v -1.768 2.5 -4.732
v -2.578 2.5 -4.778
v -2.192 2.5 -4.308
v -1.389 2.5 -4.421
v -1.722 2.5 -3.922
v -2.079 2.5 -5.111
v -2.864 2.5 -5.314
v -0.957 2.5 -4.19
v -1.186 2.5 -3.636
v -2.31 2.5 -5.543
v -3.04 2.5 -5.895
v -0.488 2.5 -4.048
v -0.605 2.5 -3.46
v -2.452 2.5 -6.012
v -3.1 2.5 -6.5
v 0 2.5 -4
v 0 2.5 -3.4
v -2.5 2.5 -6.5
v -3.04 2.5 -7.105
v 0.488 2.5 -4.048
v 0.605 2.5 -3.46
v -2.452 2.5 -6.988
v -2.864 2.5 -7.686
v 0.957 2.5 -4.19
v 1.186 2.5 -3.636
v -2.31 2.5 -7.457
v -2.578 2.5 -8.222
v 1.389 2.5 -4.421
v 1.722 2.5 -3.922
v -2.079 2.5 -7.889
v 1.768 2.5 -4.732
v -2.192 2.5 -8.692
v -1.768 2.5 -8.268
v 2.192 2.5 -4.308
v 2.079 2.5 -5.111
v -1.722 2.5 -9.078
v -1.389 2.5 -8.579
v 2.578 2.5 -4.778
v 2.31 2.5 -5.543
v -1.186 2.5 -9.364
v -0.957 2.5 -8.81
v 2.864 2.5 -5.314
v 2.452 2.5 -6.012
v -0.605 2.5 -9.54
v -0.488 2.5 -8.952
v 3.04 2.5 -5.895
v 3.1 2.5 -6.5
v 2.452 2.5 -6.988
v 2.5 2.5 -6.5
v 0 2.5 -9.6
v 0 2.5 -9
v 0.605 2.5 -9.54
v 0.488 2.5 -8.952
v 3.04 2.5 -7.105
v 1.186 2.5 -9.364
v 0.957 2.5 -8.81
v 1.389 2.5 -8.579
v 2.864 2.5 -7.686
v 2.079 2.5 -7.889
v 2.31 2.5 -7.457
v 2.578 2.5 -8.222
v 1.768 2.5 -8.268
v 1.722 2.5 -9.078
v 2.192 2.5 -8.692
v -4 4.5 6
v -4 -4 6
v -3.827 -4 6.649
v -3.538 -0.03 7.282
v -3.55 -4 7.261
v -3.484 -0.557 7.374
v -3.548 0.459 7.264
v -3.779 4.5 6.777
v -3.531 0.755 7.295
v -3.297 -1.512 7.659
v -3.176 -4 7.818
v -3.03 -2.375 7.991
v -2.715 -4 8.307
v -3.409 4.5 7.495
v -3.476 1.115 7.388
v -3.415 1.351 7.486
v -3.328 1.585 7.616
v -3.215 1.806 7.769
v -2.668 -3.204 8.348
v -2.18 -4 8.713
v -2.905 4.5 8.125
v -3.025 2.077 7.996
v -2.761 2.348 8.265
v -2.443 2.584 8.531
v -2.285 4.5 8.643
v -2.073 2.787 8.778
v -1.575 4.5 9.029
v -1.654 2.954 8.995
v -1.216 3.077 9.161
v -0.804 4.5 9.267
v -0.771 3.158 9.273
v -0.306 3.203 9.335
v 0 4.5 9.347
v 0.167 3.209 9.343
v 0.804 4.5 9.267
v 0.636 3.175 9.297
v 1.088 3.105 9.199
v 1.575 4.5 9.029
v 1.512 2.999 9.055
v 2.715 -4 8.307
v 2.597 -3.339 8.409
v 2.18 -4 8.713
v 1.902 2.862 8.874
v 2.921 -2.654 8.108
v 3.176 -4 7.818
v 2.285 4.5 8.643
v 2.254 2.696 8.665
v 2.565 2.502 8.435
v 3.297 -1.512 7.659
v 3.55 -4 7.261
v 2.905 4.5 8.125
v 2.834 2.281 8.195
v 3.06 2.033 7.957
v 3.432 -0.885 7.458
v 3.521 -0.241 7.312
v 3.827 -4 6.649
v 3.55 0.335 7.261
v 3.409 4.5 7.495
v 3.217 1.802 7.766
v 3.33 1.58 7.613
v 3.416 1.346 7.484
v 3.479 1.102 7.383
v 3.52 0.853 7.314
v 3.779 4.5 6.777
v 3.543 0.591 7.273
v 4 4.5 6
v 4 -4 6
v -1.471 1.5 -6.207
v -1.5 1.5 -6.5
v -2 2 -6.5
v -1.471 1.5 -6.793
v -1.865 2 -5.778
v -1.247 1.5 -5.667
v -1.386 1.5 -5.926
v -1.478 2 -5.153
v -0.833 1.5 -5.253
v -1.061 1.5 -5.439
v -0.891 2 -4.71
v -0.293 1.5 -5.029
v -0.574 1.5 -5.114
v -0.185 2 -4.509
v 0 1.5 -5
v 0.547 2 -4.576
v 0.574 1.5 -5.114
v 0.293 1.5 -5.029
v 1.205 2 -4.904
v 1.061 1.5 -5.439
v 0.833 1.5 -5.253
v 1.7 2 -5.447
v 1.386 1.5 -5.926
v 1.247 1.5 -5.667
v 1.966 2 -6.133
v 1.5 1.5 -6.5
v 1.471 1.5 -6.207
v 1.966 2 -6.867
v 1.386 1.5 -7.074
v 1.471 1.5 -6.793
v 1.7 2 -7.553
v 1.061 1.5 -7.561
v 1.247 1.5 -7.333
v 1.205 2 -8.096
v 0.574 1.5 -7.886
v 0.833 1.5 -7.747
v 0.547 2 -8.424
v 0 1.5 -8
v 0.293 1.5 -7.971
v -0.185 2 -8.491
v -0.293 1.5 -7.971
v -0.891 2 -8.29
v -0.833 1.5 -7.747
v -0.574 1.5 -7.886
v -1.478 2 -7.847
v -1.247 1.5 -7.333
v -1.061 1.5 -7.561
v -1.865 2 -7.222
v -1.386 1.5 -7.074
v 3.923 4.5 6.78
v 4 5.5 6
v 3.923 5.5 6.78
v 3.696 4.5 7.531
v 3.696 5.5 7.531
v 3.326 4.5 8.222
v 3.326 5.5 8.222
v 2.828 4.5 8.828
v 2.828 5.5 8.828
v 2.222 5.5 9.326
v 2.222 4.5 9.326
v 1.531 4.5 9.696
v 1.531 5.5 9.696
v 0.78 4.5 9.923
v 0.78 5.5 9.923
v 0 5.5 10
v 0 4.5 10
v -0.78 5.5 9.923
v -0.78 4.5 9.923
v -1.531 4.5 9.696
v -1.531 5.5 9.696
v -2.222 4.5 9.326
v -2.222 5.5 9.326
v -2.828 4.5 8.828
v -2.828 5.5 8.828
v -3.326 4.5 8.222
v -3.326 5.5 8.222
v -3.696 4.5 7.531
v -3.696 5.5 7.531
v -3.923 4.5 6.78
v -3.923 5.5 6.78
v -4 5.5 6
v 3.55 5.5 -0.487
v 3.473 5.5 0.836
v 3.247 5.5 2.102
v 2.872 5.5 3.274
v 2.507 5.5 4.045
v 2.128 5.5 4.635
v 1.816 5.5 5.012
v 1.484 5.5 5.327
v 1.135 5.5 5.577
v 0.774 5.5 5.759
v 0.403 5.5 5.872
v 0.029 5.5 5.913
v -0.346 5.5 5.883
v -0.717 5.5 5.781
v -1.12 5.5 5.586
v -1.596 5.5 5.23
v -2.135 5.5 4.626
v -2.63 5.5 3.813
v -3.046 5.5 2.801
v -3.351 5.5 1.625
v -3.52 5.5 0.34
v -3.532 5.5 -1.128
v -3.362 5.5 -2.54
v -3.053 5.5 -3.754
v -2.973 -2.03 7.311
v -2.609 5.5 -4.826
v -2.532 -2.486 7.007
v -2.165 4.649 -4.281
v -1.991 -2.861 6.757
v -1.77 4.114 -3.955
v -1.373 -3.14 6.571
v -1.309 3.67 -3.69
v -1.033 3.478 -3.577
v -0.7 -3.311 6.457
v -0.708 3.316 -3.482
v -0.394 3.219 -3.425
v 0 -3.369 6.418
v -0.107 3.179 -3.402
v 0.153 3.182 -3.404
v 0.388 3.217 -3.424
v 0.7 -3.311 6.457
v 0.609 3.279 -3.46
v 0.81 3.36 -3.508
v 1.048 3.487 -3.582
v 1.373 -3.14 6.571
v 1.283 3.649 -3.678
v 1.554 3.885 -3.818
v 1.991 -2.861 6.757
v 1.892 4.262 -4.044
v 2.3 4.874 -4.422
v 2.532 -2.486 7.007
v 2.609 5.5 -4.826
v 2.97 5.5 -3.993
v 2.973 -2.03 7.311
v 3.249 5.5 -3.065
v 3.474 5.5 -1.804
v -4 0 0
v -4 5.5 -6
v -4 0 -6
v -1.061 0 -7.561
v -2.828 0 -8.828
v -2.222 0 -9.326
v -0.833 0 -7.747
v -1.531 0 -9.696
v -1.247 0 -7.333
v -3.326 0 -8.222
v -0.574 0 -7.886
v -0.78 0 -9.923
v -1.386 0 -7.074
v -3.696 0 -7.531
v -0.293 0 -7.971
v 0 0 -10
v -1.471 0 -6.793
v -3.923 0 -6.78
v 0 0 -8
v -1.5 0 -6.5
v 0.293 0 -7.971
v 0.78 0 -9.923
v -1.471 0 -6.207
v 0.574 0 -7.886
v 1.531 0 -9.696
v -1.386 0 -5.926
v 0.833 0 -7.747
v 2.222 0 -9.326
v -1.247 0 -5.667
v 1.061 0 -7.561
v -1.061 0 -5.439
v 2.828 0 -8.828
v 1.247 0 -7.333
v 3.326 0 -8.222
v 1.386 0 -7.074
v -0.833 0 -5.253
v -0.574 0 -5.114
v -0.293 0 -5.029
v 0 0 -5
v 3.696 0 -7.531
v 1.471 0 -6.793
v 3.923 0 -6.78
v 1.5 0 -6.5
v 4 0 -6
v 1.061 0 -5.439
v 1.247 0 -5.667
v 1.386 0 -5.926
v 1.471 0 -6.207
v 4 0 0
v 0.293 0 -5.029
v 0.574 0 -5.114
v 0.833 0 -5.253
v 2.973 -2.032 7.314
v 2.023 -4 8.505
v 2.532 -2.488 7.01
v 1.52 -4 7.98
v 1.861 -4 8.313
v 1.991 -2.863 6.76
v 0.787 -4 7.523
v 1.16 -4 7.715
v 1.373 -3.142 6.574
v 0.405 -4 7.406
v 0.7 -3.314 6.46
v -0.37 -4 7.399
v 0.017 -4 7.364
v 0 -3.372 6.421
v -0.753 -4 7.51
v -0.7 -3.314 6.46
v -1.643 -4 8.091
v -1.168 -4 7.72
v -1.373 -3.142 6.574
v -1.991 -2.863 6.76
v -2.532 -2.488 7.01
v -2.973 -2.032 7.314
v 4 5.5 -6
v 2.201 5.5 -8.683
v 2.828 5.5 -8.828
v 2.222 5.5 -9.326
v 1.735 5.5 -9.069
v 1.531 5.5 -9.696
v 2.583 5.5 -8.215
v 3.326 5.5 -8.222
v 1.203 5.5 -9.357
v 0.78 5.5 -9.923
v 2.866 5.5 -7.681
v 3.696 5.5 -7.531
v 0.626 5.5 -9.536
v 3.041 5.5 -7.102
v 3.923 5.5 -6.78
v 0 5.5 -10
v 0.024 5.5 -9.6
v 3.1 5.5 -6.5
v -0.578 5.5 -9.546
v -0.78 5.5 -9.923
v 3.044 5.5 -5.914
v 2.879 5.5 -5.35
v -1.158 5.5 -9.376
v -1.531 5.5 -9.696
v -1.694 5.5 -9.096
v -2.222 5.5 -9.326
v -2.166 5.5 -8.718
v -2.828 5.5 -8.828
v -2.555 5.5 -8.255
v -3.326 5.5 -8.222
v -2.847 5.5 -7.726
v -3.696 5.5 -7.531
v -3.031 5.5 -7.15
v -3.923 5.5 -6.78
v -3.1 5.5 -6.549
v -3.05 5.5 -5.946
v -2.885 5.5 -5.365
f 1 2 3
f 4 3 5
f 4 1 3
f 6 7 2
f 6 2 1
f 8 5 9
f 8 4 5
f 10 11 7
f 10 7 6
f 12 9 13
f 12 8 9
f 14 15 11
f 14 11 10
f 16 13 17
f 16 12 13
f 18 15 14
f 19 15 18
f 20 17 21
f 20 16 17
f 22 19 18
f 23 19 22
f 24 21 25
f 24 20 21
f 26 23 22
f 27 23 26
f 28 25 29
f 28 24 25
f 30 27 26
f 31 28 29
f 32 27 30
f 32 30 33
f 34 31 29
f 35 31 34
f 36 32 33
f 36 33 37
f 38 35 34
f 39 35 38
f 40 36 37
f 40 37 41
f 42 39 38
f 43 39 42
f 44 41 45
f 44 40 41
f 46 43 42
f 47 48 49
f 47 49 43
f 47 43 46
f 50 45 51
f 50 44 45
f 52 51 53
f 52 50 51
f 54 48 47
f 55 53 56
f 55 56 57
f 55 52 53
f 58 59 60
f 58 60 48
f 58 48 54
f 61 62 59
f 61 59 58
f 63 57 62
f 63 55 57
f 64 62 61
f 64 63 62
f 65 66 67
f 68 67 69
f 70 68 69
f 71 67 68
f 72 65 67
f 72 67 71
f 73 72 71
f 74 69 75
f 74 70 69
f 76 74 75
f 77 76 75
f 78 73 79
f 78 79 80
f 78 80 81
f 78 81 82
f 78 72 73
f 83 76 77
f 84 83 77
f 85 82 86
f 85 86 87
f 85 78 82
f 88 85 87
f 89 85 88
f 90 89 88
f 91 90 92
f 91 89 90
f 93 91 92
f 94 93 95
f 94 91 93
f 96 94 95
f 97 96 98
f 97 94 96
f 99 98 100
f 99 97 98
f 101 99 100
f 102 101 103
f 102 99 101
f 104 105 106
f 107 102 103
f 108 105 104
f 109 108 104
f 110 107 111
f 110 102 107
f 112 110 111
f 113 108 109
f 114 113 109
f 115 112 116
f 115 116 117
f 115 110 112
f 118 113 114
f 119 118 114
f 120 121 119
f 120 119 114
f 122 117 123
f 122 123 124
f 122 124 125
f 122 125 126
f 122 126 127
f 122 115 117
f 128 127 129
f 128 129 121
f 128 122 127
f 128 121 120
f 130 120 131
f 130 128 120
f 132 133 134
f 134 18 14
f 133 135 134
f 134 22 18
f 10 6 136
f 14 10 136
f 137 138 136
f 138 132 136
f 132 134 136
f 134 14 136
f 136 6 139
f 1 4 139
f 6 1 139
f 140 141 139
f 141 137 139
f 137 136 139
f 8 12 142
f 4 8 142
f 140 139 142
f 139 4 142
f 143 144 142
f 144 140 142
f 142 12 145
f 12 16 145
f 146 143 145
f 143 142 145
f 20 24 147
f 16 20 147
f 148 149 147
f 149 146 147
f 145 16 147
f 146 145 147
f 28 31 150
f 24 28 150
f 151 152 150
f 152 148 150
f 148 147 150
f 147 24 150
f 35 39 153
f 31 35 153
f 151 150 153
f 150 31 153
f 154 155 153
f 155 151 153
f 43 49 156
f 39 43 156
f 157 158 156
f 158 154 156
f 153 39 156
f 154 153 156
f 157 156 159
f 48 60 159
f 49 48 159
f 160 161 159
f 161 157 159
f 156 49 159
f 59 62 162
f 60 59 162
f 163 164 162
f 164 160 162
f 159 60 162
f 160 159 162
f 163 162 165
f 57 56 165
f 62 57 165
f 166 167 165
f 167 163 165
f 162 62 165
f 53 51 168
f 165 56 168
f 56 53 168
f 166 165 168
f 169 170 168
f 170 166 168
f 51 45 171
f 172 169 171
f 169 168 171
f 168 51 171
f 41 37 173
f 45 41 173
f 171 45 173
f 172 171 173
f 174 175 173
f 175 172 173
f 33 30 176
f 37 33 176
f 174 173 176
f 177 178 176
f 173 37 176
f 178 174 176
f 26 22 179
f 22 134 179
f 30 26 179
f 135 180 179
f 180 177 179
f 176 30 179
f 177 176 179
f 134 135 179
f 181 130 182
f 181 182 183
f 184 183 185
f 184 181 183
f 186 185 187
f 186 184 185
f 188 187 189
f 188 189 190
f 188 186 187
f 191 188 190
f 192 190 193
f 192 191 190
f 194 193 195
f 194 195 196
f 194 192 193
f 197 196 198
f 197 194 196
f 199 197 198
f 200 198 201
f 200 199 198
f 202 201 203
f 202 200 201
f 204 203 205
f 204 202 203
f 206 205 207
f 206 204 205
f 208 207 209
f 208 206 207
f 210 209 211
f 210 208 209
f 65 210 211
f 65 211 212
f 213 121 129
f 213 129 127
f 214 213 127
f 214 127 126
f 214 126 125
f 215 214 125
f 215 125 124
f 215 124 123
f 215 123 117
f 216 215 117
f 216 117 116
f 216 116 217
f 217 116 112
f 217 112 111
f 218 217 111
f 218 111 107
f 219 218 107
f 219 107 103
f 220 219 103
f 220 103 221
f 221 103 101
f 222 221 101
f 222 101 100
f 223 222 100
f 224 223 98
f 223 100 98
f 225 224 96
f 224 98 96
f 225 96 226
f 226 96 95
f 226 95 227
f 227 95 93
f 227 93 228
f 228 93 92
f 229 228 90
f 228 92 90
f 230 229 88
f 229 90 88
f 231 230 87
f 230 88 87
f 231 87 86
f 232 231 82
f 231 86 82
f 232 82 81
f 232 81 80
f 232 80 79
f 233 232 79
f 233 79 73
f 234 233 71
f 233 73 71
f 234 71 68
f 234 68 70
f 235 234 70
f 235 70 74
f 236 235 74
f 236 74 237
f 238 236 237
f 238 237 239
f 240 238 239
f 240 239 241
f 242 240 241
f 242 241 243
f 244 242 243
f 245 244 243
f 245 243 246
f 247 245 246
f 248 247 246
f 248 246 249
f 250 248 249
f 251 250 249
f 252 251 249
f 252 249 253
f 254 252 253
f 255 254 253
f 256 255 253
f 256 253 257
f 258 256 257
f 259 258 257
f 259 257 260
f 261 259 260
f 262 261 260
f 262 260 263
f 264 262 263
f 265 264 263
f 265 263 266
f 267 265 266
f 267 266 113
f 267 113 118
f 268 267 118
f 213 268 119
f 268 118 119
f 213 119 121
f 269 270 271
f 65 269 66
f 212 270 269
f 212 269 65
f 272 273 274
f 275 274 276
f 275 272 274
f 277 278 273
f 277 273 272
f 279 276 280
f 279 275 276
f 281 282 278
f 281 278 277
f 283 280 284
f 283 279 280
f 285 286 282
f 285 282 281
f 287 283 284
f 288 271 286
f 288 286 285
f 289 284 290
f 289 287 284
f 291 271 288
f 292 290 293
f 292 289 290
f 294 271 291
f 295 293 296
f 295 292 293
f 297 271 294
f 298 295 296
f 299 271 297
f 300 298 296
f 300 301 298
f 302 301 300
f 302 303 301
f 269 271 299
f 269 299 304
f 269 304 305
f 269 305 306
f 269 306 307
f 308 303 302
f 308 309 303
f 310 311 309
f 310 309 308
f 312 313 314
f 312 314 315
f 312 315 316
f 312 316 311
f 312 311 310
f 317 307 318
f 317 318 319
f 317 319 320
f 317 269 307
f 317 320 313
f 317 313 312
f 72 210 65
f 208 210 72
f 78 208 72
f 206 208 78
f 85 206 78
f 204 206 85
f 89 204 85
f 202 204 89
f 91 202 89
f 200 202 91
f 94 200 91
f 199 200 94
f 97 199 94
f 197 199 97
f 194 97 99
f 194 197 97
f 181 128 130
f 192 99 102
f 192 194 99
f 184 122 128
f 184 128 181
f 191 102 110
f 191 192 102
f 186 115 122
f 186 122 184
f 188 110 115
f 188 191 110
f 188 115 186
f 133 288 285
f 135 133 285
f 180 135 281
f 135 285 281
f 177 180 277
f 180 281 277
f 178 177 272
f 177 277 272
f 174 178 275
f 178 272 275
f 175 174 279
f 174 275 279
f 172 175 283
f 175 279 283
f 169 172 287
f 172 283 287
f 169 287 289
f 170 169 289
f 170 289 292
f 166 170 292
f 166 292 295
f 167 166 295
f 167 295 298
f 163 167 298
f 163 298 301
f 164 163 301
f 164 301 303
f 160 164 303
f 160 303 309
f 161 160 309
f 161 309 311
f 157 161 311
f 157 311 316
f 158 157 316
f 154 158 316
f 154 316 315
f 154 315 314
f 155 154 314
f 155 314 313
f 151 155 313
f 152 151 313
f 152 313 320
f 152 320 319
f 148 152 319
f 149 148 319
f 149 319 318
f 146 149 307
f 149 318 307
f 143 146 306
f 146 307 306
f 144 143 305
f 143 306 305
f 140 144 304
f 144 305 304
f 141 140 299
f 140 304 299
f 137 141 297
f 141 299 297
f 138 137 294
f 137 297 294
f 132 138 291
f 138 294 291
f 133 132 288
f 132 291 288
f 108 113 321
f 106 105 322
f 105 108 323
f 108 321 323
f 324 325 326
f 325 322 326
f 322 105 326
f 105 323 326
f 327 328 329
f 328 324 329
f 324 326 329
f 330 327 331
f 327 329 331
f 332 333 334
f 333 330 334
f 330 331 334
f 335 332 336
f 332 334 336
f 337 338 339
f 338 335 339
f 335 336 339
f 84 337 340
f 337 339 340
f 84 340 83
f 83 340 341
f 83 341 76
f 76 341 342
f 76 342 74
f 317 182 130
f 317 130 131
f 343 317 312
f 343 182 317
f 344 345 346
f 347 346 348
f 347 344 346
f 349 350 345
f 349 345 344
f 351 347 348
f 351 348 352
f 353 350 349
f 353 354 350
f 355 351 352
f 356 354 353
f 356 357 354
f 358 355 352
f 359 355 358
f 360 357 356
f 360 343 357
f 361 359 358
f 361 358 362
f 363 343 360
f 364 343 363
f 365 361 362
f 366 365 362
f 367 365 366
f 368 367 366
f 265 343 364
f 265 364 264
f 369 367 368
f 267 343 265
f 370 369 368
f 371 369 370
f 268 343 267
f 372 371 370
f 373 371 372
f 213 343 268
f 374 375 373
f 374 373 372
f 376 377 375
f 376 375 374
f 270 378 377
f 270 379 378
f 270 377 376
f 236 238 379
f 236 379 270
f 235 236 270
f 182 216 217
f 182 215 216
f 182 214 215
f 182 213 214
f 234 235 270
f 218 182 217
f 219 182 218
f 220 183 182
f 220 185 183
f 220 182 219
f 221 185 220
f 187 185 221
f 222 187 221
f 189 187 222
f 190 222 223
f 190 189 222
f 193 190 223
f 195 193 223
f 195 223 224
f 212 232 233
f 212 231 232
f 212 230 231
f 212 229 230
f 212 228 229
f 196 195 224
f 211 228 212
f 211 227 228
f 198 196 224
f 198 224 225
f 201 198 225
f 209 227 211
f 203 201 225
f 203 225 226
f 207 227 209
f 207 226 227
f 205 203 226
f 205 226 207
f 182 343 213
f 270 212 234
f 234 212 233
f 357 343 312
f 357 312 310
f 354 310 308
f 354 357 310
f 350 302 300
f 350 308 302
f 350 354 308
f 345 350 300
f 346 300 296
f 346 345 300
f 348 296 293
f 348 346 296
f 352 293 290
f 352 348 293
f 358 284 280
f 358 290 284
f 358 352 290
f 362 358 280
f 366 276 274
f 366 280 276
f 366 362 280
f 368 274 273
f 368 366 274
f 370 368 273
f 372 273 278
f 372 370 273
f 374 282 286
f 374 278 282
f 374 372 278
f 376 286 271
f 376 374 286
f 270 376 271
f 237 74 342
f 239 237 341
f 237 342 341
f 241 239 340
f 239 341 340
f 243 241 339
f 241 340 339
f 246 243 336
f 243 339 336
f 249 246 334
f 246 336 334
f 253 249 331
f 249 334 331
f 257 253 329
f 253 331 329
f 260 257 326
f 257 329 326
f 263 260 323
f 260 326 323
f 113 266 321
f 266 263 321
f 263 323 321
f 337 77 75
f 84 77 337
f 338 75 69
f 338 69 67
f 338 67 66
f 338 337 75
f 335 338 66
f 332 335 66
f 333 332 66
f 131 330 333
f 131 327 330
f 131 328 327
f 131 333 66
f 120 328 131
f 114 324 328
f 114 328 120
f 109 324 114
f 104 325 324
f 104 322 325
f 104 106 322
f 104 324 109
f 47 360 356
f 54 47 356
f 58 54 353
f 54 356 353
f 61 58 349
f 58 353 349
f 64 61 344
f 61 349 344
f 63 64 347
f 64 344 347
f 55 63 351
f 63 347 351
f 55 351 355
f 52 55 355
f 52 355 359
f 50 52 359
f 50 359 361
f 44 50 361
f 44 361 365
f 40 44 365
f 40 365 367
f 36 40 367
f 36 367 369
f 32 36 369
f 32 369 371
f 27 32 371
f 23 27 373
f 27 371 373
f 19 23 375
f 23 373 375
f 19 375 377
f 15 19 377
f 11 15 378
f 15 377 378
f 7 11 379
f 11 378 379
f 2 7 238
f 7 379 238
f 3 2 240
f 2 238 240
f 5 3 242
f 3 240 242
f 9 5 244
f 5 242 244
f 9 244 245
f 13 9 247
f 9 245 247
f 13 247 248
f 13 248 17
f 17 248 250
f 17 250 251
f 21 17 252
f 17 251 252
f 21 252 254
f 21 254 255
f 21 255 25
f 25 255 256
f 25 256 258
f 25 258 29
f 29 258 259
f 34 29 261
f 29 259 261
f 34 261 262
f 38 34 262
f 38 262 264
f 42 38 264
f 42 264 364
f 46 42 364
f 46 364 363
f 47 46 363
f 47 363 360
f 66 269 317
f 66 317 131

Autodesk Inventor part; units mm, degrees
ref_plane "YZ Plane" through (0, 0, 0) normal (1, 0, 0) x (0, 1, 0)
ref_plane "XZ Plane" through (0, 0, 0) normal (0, 1, 0) x (-1, 0, 0)
ref_plane "XY Plane" through (0, 0, 0) normal (0, 0, 1) x (1, 0, 0)
sketch "Sketch1" plane through (0, 0, 0) normal (0, 1, 0) x (-1, 0, 0)
  line L0 (0, 10) -> (0, 10)
  line L1 (-4, 6) -> (-4, -6)
  line L2 (0, -10) -> (0, -10)
  line L3 (4, -6) -> (4, 6)
  line L4 (4, 10) -> (-4, -10) construction
  line L5 (-4, 10) -> (4, -10) construction
  circle A0 centre (0, -6.5) radius 1.5
  arc A1 (0, -10) -> (4, -6) centre (0, -6) ccw
  arc A2 (-4, -6) -> (0, -10) centre (0, -6) ccw
  arc A3 (4, 6) -> (0, 10) centre (0, 6) ccw
  arc A4 (0, 10) -> (-4, 6) centre (0, 6) ccw
  point P0 (0, 0)
  dimension "d0" = 8
  dimension "d1" = 20
  dimension "d2" = 3
  dimension "d3" = 3.5
  dimension "d4" = 4
extrude "Extrusion1" add sketch "Sketch1" along normal blind 5.5
sketch "Sketch2" plane through (0, 0, 0) normal (0, -1, 0) x (1, 0, 0)
  circle A0 centre (0, -6.5) radius 1.5 construction
  line L0 (-4, -6) -> (-4, 6) construction
  arc A1 (-4, -6) -> (4, -6) centre (0, -6) ccw construction
  line L1 (4, 6) -> (4, -6) construction
  arc A2 (4, 6) -> (-4, 6) centre (0, 6) ccw construction
  arc A3 (4, 6) -> (-4, 6) centre (0, 6) ccw projected
  arc A4 (4, 6) -> (-4, 6) centre (0, 5.2831) ccw
  point P0 (0, 0)
extrude "Extrusion2" cut sketch "Sketch2" against normal blind 4.5
sketch "Sketch4" plane through (0, 0, 0) normal (0, -1, 0) x (1, 0, 0)
  arc A0 (4, 6) -> (-4, 6) centre (0, 5.2831) ccw projected
  line L0 (-4, -6) -> (-4, 6) projected
  arc A1 (-4, -6) -> (4, -6) centre (0, -6) ccw projected
  line L1 (4, 6) -> (4, -6) projected
  circle A2 centre (0, -6.5) radius 1.5 projected
  point P0 (0, 0)
extrude "Extrusion3" add sketch "Sketch4" along normal blind 4
sketch "Sketch6" plane through (0, -4, 0) normal (0, -1, 0) x (1, 0, 0)
  circle A0 centre (0, -6.5) radius 1.5 projected
  arc A1 (-4, -6) -> (4, -6) centre (0, -6) ccw projected
  line L0 (4, 0) -> (4, -6)
  line L1 (4, 0) -> (-4, 0)
  arc A2 (-4, -6) -> (4, -6) centre (0, -6) ccw projected
  line L2 (-4, 0) -> (-4, -6)
  point P0 (0, 0)
extrude "Extrusion4" cut sketch "Sketch6" against normal blind 4
sketch "Sketch7" plane through (-4, 5.5, -6) normal (-1, 0, 0) x (0, 0, 1)
  line L0 (12, -9.5) -> (15.3469, -9.5) projected
  line L1 (6, -9.5) -> (12, -9.5) projected
  line L2 (12, -9.5) -> (6, -9.5)
  line L3 (6, -5.5) -> (6, -9.5) projected
  line L4 (6, -9.5) -> (6, -5.5)
  line L5 (12, -9.5) -> (12, -1) projected
  line L6 (6, -5.5) -> (12, -9.5)
extrude "Extrusion5" cut sketch "Sketch7" against normal through all
ref_plane "Work Plane1" through (-4, 0.1603, 8.7735) normal (0, -0.8321, -0.5547) x (1, 0, 0)
sketch "Sketch8" plane through (0, -4, 0) normal (0, -1, 0) x (1, 0, 0)
  line L0 (-4, 6) -> (4, 6) construction
  arc A0 (4, 6) -> (-4, 6) centre (0, 5.2831) ccw construction
  point P0 (0, 0)
  point P1 (0, 9.3469)
ref_plane "Work Plane3" through (-2, -4, 6) normal (0, 0.5547, -0.8321) x (1, 0, 0)
sketch "Sketch10" plane through (-2, -4, 6) normal (0, 0.5547, -0.8321) x (1, 0, 0)
  circle A0 centre (2, -4.3065) radius 3.55
  point P0 (2, 0)
  dimension "d18" = 7.1
extrude "Extrusion6" cut sketch "Sketch10" along normal blind 20 and the other way blind 10
sketch "Sketch11" plane through (0, 5.5, 0) normal (0, 1, 0) x (1, 0, 0)
  arc A0 (1.4864, 6.2983) -> (-1.4864, 6.2983) centre (0, 6.5) ccw construction
  circle A1 centre (0, 6.5) radius 3.1
  point P0 (0, 0)
  dimension "d23" = 6.2
extrude "Extrusion7" cut sketch "Sketch11" against normal blind 3
chamfer "Chamfer1" distance 1 angle 45 1 edges at (1.5, 2.5, -6.5)
properties part number "cable_cap"
